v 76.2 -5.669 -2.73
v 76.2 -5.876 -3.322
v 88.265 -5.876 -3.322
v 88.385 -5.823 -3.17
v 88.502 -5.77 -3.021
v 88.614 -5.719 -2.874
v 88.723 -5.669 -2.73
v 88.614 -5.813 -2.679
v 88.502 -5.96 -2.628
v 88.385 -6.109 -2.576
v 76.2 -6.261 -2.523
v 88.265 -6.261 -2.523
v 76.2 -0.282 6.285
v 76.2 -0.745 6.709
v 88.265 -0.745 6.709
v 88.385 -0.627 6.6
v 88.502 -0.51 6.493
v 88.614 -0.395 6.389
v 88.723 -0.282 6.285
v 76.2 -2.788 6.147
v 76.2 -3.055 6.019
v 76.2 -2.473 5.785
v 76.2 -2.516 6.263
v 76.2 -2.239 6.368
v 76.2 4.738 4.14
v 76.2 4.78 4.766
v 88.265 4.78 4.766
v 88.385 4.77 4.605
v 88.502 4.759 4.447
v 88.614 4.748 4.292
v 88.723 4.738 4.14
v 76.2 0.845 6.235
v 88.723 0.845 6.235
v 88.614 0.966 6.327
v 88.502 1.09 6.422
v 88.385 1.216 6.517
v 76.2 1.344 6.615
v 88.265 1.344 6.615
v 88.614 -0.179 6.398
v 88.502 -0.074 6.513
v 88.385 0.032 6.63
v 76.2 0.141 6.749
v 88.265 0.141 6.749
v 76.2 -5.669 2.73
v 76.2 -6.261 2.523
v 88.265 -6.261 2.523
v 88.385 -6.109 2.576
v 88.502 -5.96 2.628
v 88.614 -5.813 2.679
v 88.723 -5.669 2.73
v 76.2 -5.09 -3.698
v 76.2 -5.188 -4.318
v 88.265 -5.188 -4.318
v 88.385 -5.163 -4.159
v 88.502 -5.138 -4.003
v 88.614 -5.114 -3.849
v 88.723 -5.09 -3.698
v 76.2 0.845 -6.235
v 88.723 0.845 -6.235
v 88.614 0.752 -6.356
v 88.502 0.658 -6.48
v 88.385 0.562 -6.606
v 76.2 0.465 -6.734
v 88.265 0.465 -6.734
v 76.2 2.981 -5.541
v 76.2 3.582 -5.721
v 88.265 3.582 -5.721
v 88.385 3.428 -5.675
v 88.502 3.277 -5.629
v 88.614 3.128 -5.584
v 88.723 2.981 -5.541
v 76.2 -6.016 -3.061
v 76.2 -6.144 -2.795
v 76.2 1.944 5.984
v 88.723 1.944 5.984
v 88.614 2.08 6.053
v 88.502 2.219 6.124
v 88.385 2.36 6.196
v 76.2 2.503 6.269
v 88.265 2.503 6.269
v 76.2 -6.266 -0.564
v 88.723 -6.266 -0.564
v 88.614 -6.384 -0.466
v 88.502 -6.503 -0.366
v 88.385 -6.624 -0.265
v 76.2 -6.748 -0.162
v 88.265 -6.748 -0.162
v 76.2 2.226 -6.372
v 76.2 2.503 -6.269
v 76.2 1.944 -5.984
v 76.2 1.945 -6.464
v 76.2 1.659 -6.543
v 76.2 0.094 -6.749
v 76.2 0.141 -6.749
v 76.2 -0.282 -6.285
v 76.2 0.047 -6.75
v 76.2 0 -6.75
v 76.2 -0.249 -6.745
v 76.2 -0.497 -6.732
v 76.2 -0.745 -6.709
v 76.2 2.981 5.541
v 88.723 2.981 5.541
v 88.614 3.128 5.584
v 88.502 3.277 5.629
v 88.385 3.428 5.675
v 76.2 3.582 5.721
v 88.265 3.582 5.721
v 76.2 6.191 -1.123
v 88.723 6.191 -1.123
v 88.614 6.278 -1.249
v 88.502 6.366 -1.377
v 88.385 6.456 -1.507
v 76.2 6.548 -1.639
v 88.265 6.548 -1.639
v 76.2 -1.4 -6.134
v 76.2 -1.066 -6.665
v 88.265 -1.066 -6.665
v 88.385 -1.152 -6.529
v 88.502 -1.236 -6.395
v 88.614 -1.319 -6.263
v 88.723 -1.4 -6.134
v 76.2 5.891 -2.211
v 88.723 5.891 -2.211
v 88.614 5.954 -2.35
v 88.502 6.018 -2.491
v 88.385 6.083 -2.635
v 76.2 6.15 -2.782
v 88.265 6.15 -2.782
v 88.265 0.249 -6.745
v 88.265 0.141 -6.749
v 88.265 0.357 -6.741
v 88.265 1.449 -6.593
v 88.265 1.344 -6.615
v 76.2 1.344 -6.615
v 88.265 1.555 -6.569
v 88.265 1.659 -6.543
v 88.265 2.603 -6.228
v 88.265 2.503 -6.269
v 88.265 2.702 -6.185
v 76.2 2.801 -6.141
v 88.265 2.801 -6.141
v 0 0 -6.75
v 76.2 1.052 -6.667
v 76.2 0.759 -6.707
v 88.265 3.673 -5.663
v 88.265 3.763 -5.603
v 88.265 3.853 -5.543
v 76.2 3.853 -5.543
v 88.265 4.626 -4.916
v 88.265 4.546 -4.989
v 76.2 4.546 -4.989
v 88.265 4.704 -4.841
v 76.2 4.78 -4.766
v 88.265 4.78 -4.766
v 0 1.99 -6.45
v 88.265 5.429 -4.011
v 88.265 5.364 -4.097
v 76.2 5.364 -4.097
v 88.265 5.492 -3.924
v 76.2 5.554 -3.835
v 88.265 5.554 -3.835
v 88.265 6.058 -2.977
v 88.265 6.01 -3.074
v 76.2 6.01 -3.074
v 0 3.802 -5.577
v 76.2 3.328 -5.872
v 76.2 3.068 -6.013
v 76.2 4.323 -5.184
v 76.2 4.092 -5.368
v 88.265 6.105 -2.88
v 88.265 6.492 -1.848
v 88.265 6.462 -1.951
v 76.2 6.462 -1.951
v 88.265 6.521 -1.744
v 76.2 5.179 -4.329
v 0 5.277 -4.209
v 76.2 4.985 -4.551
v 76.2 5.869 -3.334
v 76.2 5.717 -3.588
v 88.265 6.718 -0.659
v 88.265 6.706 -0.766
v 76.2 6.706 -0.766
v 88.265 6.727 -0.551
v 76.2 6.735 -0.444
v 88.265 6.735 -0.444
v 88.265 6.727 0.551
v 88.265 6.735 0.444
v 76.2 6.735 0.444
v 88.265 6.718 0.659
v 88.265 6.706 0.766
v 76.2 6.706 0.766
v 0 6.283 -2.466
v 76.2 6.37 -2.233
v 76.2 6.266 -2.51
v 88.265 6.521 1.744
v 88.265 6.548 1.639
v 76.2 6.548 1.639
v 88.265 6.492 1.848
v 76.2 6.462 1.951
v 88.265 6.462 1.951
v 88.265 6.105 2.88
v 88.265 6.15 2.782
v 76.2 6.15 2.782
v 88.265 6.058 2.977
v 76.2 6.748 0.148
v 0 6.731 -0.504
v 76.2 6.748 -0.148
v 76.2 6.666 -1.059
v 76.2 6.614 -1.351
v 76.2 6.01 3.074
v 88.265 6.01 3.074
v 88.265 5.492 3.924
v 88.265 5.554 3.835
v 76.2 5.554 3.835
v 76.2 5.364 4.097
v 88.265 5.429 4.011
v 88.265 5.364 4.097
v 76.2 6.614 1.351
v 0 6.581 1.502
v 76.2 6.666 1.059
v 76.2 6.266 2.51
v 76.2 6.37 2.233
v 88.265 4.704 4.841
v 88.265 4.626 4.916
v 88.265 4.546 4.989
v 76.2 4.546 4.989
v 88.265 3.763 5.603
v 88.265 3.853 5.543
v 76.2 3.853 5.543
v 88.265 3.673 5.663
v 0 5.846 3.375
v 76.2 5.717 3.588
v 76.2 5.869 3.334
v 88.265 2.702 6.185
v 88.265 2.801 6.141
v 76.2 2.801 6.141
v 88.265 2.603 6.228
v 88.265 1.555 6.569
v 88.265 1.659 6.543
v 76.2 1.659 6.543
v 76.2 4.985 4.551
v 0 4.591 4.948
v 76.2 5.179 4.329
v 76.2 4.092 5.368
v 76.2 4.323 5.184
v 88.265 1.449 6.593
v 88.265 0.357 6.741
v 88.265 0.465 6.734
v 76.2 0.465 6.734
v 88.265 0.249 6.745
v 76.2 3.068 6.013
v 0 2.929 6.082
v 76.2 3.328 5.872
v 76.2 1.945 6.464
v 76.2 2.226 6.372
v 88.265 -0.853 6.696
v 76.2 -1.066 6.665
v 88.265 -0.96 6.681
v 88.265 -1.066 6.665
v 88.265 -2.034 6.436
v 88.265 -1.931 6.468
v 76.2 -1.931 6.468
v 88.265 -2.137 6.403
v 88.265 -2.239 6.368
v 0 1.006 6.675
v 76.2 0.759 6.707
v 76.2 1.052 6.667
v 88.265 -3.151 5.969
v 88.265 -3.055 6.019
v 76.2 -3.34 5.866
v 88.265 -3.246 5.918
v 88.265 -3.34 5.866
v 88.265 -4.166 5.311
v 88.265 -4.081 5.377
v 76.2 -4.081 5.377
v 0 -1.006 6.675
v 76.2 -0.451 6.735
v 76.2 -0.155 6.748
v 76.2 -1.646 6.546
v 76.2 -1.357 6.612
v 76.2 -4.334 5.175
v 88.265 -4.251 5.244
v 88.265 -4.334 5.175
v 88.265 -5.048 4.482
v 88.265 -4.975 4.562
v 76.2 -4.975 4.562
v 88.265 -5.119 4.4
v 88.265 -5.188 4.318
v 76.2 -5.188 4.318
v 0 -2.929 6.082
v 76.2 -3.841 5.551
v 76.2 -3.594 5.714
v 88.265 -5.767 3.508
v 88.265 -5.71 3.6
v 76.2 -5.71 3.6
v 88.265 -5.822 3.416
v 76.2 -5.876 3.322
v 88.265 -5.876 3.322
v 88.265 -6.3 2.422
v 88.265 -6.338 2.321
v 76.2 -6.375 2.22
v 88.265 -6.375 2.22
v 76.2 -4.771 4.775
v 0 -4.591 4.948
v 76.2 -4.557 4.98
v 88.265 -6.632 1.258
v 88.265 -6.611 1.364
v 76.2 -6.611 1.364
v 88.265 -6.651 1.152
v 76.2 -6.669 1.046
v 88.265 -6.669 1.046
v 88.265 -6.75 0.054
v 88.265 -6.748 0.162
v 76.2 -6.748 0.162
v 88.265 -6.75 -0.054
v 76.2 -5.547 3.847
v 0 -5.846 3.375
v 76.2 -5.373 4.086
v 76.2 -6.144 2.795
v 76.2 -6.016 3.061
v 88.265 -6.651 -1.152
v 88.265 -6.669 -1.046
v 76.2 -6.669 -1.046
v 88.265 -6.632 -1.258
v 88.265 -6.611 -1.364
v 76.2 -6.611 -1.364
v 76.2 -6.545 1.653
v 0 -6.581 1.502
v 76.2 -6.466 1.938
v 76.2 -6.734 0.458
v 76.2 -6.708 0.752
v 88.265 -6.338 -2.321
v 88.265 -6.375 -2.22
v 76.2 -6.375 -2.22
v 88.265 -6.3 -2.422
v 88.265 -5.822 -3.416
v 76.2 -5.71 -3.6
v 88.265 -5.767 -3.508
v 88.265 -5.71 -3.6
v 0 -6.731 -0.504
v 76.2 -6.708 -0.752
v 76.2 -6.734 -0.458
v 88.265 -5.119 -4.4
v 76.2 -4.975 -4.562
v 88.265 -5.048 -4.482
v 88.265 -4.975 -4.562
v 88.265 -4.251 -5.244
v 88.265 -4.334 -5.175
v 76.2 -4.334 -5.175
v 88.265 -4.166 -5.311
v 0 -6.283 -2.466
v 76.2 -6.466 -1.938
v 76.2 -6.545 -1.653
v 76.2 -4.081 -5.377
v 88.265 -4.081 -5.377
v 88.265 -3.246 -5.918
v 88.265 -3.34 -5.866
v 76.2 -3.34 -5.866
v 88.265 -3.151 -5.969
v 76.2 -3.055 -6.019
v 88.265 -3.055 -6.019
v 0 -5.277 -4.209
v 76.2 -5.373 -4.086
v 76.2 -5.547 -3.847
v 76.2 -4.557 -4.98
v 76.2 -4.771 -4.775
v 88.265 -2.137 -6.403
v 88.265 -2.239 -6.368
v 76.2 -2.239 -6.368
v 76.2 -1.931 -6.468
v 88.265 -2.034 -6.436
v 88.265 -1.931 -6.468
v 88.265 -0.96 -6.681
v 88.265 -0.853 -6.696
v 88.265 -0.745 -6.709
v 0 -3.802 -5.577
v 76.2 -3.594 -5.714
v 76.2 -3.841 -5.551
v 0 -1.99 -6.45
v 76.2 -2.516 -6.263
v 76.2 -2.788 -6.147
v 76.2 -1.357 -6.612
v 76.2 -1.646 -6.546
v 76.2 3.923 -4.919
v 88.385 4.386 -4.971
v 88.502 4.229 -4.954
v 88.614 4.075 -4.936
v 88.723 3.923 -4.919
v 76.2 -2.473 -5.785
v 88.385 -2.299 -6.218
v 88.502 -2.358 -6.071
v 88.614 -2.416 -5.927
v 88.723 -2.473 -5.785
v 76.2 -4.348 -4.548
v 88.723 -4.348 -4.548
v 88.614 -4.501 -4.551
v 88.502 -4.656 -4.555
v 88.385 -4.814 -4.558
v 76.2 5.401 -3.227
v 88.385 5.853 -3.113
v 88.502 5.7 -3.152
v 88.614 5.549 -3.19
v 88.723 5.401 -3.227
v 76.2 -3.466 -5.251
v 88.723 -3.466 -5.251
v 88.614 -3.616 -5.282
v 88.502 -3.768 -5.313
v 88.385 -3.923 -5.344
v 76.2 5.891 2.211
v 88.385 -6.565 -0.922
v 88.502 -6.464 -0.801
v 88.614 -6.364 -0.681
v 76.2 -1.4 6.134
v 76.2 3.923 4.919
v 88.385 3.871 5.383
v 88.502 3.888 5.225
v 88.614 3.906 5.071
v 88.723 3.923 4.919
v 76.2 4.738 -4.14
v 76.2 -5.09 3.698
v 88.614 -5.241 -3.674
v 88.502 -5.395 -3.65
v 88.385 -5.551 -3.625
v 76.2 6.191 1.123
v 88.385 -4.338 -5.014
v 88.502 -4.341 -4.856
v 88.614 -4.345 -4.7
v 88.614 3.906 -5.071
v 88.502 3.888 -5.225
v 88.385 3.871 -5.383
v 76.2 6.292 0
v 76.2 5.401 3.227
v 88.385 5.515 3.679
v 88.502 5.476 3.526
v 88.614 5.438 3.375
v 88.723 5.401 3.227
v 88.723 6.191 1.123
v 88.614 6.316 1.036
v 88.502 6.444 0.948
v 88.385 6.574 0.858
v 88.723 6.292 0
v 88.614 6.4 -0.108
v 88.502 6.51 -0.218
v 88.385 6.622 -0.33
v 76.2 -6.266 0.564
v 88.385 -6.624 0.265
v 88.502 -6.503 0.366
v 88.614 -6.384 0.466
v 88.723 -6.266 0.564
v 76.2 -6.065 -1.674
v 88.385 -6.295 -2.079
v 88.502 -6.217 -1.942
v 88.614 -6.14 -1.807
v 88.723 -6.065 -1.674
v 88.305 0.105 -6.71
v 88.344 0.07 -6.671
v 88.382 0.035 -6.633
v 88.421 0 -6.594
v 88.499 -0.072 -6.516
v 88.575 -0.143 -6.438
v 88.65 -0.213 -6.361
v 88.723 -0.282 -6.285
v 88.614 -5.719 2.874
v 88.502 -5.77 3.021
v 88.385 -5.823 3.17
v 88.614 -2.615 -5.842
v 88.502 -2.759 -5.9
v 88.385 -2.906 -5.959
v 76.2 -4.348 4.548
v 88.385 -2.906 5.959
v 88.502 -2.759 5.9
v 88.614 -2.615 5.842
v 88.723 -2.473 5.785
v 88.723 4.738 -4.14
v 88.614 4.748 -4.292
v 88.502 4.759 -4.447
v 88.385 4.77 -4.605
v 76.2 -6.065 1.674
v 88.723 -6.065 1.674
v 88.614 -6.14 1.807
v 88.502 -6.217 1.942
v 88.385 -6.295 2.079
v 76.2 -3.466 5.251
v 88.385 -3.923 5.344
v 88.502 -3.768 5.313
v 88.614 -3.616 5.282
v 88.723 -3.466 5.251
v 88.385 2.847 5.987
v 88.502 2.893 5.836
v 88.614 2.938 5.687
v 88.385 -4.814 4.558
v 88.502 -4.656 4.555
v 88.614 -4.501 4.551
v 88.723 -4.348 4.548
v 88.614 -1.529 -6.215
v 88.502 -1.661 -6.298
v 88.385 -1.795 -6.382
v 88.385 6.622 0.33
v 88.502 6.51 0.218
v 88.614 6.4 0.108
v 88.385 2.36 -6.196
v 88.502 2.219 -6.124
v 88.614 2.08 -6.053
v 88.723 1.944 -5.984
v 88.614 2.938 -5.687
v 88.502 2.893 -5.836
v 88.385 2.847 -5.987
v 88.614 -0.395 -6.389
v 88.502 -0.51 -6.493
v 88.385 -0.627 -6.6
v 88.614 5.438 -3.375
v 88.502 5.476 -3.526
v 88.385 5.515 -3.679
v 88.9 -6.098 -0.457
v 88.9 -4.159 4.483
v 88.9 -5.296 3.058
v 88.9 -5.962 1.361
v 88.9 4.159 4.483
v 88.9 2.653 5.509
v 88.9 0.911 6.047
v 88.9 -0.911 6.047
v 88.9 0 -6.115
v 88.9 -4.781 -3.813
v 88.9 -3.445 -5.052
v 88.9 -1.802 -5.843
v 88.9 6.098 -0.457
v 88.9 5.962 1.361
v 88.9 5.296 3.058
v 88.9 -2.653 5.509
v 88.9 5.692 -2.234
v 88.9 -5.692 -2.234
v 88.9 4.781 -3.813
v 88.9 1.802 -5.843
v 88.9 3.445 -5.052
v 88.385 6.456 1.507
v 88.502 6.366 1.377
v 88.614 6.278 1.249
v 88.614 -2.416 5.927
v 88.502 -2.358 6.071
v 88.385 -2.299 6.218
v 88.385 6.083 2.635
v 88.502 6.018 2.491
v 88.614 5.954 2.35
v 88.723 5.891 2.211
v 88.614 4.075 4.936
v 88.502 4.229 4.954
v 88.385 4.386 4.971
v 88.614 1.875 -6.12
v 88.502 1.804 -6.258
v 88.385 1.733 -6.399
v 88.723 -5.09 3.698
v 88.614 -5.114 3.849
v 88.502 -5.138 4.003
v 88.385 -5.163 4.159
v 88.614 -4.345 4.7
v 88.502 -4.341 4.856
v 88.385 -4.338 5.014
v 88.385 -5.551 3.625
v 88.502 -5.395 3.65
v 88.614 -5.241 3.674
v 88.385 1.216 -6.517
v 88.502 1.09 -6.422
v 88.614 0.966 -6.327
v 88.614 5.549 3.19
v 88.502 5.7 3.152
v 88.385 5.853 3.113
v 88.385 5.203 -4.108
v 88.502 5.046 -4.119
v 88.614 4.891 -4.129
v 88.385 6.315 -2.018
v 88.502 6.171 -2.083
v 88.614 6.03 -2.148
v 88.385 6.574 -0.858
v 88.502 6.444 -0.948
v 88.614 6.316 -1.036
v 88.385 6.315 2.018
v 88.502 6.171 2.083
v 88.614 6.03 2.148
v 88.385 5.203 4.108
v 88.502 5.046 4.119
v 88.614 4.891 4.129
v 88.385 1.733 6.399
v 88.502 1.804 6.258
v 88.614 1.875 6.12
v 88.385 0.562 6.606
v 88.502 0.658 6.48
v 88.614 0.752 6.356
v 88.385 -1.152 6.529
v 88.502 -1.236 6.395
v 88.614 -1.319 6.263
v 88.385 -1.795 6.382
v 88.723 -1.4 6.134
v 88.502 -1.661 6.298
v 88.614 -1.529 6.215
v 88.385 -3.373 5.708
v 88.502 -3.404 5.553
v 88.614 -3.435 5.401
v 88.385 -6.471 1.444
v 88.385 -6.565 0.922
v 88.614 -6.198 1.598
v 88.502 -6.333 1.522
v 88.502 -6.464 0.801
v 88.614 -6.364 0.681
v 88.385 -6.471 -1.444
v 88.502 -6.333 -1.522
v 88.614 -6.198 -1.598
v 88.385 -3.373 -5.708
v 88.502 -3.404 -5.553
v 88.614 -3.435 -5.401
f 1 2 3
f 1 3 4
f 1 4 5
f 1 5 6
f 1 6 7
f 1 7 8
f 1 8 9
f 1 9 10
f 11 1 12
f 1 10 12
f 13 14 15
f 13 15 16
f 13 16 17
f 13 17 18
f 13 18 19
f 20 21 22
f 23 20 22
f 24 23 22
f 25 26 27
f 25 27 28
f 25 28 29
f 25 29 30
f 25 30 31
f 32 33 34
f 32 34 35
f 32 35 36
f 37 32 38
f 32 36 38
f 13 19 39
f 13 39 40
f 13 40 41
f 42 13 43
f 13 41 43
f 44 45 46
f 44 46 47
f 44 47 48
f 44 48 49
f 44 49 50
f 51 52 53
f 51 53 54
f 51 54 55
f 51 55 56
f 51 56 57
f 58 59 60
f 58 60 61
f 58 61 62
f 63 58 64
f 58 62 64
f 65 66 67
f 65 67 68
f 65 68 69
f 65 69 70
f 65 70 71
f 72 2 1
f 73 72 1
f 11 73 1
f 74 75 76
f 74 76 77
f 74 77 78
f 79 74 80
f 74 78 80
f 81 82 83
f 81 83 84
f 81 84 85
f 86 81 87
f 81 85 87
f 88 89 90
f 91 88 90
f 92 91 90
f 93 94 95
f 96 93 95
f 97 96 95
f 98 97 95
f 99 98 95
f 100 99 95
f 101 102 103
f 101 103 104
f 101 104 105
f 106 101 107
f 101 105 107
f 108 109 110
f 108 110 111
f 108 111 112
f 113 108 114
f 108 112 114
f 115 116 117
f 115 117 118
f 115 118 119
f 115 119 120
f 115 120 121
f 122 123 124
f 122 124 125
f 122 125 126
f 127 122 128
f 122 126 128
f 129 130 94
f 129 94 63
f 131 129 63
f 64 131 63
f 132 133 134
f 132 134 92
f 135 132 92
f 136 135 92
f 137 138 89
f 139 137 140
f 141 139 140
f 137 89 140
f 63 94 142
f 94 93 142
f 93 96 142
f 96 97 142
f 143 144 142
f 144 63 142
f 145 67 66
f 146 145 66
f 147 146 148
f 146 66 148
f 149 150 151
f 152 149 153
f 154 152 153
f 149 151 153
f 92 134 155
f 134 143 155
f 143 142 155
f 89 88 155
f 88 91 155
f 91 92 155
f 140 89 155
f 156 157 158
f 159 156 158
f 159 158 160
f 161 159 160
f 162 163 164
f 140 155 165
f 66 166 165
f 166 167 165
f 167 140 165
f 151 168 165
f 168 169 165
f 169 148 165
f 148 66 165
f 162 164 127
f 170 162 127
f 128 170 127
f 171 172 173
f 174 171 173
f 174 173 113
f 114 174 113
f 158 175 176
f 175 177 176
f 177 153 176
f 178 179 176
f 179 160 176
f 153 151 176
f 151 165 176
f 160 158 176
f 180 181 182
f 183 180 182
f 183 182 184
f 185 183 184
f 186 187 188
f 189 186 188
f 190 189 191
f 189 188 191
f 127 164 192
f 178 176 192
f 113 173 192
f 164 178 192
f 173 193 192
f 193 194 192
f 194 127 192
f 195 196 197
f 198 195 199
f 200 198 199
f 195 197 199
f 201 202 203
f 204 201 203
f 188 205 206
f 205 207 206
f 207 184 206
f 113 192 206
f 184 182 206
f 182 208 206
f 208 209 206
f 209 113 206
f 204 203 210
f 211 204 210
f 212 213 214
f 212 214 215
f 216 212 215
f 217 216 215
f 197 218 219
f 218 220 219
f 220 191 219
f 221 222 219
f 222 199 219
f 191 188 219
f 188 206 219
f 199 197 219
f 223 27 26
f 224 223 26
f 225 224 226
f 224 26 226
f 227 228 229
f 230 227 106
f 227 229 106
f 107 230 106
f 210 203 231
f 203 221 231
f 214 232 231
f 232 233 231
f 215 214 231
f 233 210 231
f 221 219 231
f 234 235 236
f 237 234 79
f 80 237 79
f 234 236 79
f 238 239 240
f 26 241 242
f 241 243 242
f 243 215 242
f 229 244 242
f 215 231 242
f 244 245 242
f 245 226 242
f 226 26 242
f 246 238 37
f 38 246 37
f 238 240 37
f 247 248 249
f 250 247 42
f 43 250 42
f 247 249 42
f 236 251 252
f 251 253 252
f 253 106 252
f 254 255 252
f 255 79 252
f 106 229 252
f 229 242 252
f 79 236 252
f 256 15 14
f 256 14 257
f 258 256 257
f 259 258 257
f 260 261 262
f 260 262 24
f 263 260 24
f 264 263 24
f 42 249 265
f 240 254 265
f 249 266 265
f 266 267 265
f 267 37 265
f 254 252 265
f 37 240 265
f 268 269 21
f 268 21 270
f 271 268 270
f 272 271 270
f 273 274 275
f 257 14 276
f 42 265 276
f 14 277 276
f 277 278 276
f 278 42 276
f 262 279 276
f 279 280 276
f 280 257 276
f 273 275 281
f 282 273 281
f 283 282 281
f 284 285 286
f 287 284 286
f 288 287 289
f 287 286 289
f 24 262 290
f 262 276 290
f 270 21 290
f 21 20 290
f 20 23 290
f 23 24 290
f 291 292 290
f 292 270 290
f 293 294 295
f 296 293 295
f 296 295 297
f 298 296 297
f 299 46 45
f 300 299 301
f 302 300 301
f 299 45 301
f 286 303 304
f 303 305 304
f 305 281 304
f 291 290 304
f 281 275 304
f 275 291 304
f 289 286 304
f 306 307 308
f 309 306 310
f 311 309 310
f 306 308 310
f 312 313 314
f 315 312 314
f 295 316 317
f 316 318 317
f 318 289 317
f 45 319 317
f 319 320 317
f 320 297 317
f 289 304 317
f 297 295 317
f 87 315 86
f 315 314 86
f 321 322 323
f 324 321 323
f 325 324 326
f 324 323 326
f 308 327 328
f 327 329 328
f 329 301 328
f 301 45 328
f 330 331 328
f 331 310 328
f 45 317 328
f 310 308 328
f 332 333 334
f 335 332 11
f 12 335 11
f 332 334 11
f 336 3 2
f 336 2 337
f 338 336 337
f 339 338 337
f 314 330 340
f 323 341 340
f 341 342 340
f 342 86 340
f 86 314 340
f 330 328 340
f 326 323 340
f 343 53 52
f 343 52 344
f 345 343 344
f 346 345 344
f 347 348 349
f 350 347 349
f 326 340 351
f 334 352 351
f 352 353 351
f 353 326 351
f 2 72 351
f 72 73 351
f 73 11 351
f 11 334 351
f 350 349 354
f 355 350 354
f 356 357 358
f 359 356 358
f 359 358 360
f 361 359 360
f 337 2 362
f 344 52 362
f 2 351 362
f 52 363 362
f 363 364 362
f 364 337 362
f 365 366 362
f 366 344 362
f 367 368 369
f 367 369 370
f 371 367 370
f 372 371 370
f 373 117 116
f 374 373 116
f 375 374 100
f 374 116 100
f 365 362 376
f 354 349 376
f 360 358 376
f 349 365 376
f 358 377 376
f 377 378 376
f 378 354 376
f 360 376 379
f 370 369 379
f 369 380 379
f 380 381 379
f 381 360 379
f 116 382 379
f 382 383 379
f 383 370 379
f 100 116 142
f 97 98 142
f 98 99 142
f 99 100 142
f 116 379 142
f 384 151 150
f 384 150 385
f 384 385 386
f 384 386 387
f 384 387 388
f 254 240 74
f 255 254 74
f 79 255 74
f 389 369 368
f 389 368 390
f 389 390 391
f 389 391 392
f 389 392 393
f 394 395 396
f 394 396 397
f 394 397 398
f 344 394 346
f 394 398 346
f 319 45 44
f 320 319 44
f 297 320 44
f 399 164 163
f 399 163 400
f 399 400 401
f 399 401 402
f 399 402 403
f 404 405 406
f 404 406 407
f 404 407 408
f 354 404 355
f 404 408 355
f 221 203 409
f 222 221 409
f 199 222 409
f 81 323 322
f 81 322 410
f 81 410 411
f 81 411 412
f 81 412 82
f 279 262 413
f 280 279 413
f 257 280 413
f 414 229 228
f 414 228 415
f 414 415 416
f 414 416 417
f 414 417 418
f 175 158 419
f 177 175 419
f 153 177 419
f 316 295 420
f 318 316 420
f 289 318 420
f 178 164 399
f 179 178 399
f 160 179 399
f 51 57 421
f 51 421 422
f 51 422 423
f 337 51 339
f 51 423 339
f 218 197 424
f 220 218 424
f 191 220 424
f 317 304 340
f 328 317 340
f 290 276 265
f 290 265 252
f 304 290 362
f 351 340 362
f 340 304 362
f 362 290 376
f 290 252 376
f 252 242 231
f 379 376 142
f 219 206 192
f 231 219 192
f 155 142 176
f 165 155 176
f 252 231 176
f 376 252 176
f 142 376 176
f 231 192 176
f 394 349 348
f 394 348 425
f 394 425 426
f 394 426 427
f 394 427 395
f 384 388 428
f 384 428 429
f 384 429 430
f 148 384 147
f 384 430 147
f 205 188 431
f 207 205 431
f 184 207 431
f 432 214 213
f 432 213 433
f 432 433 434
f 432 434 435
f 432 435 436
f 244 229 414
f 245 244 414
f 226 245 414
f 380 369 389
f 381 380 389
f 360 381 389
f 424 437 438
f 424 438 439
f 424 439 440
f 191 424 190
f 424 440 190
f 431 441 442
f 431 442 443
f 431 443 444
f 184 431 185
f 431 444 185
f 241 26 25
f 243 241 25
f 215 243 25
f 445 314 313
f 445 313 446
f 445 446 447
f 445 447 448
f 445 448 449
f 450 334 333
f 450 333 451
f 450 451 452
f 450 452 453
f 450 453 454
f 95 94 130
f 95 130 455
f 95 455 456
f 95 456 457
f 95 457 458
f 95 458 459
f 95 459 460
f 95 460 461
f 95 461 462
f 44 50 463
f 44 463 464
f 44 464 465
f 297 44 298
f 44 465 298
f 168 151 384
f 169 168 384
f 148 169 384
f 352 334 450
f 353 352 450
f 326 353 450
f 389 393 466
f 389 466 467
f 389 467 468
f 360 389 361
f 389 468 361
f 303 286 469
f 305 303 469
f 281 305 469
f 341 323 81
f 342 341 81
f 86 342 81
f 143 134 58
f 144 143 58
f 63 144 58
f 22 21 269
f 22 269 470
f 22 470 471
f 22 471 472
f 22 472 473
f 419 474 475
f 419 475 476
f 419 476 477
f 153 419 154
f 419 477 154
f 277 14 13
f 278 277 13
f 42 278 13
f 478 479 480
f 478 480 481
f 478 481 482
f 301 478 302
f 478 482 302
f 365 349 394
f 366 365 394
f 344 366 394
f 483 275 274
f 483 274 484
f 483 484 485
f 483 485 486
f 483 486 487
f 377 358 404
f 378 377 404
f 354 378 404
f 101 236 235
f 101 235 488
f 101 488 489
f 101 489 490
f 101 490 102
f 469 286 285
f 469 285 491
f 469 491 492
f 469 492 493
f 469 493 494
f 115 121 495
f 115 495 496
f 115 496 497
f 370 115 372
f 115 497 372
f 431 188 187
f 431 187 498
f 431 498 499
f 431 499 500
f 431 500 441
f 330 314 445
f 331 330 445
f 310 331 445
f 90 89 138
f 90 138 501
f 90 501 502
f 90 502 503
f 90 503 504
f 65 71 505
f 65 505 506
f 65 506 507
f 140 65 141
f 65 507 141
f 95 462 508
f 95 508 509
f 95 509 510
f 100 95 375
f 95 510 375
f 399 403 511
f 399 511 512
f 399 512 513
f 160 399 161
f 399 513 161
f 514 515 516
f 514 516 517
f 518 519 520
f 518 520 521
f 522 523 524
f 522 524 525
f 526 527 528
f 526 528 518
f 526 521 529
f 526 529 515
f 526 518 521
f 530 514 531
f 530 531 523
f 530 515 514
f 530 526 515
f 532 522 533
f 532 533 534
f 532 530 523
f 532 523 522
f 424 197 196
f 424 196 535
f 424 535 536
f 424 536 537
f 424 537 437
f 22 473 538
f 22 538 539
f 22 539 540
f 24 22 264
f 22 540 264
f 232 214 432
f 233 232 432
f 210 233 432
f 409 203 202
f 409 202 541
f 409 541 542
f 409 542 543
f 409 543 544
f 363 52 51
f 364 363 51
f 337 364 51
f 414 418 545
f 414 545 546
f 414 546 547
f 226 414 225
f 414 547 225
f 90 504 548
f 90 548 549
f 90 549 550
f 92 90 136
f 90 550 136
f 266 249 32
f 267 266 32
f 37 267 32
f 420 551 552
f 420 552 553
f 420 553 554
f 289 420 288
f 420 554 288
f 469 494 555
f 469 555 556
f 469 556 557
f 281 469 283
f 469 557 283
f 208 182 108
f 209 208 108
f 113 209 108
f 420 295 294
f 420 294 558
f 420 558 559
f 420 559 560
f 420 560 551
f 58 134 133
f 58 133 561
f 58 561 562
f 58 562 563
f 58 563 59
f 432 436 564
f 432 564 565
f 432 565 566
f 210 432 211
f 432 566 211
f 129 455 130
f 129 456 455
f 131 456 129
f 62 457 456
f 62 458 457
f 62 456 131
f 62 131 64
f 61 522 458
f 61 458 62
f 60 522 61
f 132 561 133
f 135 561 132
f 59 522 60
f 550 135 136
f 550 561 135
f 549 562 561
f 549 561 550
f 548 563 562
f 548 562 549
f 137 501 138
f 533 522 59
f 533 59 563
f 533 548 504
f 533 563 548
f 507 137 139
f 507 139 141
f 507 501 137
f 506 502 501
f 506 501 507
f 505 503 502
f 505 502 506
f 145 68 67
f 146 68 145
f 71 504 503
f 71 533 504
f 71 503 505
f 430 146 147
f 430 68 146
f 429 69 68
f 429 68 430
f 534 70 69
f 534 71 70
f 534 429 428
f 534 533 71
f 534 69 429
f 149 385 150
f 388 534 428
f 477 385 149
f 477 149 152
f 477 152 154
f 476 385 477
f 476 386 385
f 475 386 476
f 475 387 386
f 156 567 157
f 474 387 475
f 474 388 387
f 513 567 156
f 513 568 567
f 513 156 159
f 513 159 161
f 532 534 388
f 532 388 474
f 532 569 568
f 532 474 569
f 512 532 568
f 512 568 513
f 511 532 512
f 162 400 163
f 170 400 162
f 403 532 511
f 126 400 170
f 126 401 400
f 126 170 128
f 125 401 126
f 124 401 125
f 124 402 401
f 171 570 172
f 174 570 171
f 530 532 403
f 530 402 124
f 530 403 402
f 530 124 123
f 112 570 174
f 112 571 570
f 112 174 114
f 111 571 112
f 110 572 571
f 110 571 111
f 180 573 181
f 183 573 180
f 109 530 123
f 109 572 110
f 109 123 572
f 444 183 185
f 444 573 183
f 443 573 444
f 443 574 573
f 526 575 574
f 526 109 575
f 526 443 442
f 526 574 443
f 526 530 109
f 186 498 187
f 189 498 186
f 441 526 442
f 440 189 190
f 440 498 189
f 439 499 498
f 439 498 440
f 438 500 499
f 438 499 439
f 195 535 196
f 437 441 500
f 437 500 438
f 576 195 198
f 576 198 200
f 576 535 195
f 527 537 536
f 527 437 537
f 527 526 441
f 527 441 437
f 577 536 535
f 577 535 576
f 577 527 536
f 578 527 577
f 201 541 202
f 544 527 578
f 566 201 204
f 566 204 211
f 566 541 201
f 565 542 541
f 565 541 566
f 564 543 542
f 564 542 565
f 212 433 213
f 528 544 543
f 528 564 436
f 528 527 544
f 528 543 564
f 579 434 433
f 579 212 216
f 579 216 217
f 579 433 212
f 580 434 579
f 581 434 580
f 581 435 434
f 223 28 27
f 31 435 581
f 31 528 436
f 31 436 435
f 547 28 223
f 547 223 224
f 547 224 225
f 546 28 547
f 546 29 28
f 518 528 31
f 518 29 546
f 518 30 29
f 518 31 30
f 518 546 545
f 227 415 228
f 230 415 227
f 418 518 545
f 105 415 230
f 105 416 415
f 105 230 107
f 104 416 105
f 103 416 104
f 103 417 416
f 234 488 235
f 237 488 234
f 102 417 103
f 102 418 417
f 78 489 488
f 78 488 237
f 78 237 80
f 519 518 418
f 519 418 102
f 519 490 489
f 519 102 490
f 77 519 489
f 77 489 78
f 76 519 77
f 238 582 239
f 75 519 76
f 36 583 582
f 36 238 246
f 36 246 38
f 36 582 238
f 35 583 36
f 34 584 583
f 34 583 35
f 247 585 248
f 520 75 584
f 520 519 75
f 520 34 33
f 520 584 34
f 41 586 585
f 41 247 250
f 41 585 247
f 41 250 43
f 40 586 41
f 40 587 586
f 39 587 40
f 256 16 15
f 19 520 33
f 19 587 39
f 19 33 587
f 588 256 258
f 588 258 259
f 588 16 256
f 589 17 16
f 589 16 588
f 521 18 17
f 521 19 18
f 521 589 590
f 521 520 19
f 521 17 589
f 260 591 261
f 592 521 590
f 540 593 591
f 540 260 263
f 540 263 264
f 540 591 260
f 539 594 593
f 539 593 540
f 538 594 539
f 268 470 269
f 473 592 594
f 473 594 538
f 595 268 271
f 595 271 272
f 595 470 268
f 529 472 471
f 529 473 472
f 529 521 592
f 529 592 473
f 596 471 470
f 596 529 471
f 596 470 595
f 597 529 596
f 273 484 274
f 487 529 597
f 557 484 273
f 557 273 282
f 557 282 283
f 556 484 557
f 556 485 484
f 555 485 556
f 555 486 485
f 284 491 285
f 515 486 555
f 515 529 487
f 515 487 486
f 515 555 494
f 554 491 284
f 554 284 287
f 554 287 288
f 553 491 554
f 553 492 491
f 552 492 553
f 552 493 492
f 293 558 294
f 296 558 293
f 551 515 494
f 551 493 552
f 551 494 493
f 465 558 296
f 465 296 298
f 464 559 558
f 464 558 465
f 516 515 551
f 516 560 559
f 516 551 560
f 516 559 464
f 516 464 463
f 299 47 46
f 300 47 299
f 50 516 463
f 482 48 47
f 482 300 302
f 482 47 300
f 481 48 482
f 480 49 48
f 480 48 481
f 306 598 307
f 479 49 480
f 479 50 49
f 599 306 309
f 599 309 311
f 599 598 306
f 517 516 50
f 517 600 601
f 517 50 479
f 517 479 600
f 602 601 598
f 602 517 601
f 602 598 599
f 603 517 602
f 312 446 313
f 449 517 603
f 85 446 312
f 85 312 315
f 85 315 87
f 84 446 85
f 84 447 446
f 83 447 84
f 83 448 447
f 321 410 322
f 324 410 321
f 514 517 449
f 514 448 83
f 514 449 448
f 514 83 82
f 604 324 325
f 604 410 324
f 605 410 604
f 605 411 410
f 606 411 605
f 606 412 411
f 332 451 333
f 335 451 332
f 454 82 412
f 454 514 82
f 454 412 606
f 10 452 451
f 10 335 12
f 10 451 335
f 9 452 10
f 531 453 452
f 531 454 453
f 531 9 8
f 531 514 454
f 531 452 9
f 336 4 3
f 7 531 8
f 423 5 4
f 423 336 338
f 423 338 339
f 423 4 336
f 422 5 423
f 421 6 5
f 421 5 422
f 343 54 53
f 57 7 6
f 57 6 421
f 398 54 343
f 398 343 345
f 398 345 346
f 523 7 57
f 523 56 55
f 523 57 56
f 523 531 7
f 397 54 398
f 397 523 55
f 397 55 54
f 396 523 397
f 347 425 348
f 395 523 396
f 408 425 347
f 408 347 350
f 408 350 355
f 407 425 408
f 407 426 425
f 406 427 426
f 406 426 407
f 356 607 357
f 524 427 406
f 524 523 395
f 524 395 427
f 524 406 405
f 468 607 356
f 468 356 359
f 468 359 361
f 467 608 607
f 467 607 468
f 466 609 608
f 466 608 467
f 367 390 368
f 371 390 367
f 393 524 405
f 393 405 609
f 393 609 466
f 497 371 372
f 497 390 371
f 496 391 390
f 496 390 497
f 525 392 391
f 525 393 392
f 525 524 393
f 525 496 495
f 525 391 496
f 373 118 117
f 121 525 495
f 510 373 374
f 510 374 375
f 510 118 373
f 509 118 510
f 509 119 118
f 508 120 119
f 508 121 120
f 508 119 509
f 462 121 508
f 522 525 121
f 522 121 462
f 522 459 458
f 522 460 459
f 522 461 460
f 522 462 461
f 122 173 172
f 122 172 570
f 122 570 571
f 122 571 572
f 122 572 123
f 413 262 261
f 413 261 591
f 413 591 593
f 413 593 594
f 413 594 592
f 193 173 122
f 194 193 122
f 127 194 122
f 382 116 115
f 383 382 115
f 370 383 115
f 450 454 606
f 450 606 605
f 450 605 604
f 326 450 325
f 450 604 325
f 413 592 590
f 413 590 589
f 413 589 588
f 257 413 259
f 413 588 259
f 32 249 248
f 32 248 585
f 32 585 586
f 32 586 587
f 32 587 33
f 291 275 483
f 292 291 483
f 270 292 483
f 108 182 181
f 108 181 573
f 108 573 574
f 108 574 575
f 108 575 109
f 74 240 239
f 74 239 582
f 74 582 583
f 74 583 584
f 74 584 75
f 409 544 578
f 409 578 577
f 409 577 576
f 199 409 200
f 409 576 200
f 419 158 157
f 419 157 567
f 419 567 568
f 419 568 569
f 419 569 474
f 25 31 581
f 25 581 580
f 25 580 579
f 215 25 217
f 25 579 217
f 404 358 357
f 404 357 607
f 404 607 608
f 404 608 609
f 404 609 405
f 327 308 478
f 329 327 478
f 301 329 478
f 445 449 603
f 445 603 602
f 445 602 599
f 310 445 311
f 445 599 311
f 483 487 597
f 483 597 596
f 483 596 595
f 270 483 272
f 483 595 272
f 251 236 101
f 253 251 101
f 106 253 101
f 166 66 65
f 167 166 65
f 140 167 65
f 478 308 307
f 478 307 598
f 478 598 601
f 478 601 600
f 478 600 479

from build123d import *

# Parameters (mm, degrees)
SKETCH1_R           = 6.75
BOSS_EXTRUDE1_DEPTH = 88.9
CHAMFER1_SIZE       = 0.635
CUT_EXTRUDE1_DEPTH  = 12.7
CIRPATTERN2_COUNT   = 35


with BuildPart() as part:
    # Sketch1 → Boss-Extrude1 (new body)
    with BuildSketch(Plane(origin=(0, 0, 0), x_dir=(0, 0, -1), z_dir=(1, 0, 0))):
        Circle(SKETCH1_R)
    extrude(amount=BOSS_EXTRUDE1_DEPTH)

    # Chamfer1
    chamfer1_edges = [part.edges().sort_by_distance(p)[0] for p in [
        (88.9, 0, 6.75),
    ]]
    chamfer(chamfer1_edges, length=CHAMFER1_SIZE)

    # Sketch2 → Cut-Extrude1 (cut)
    with BuildSketch(Plane(origin=(88.9, 0, 0), x_dir=(0, 0, -1), z_dir=(1, 0, 0))):
        Polygon((-1.067952277, 7.359736044), (0, 6.291783767), (1.067952277, 7.359736044), align=None)
    cut_extrude1 = extrude(amount=-CUT_EXTRUDE1_DEPTH, mode=Mode.SUBTRACT)

    # CirPattern2: Cut-Extrude1 ×35 about axis
    cirpattern2_axis = Axis((88.9, 0, 0), (-1, 0, 0))
    for i in range(1, CIRPATTERN2_COUNT):
        add(cut_extrude1.rotate(cirpattern2_axis, i * 360 / CIRPATTERN2_COUNT), mode=Mode.SUBTRACT)


solid = part.part
